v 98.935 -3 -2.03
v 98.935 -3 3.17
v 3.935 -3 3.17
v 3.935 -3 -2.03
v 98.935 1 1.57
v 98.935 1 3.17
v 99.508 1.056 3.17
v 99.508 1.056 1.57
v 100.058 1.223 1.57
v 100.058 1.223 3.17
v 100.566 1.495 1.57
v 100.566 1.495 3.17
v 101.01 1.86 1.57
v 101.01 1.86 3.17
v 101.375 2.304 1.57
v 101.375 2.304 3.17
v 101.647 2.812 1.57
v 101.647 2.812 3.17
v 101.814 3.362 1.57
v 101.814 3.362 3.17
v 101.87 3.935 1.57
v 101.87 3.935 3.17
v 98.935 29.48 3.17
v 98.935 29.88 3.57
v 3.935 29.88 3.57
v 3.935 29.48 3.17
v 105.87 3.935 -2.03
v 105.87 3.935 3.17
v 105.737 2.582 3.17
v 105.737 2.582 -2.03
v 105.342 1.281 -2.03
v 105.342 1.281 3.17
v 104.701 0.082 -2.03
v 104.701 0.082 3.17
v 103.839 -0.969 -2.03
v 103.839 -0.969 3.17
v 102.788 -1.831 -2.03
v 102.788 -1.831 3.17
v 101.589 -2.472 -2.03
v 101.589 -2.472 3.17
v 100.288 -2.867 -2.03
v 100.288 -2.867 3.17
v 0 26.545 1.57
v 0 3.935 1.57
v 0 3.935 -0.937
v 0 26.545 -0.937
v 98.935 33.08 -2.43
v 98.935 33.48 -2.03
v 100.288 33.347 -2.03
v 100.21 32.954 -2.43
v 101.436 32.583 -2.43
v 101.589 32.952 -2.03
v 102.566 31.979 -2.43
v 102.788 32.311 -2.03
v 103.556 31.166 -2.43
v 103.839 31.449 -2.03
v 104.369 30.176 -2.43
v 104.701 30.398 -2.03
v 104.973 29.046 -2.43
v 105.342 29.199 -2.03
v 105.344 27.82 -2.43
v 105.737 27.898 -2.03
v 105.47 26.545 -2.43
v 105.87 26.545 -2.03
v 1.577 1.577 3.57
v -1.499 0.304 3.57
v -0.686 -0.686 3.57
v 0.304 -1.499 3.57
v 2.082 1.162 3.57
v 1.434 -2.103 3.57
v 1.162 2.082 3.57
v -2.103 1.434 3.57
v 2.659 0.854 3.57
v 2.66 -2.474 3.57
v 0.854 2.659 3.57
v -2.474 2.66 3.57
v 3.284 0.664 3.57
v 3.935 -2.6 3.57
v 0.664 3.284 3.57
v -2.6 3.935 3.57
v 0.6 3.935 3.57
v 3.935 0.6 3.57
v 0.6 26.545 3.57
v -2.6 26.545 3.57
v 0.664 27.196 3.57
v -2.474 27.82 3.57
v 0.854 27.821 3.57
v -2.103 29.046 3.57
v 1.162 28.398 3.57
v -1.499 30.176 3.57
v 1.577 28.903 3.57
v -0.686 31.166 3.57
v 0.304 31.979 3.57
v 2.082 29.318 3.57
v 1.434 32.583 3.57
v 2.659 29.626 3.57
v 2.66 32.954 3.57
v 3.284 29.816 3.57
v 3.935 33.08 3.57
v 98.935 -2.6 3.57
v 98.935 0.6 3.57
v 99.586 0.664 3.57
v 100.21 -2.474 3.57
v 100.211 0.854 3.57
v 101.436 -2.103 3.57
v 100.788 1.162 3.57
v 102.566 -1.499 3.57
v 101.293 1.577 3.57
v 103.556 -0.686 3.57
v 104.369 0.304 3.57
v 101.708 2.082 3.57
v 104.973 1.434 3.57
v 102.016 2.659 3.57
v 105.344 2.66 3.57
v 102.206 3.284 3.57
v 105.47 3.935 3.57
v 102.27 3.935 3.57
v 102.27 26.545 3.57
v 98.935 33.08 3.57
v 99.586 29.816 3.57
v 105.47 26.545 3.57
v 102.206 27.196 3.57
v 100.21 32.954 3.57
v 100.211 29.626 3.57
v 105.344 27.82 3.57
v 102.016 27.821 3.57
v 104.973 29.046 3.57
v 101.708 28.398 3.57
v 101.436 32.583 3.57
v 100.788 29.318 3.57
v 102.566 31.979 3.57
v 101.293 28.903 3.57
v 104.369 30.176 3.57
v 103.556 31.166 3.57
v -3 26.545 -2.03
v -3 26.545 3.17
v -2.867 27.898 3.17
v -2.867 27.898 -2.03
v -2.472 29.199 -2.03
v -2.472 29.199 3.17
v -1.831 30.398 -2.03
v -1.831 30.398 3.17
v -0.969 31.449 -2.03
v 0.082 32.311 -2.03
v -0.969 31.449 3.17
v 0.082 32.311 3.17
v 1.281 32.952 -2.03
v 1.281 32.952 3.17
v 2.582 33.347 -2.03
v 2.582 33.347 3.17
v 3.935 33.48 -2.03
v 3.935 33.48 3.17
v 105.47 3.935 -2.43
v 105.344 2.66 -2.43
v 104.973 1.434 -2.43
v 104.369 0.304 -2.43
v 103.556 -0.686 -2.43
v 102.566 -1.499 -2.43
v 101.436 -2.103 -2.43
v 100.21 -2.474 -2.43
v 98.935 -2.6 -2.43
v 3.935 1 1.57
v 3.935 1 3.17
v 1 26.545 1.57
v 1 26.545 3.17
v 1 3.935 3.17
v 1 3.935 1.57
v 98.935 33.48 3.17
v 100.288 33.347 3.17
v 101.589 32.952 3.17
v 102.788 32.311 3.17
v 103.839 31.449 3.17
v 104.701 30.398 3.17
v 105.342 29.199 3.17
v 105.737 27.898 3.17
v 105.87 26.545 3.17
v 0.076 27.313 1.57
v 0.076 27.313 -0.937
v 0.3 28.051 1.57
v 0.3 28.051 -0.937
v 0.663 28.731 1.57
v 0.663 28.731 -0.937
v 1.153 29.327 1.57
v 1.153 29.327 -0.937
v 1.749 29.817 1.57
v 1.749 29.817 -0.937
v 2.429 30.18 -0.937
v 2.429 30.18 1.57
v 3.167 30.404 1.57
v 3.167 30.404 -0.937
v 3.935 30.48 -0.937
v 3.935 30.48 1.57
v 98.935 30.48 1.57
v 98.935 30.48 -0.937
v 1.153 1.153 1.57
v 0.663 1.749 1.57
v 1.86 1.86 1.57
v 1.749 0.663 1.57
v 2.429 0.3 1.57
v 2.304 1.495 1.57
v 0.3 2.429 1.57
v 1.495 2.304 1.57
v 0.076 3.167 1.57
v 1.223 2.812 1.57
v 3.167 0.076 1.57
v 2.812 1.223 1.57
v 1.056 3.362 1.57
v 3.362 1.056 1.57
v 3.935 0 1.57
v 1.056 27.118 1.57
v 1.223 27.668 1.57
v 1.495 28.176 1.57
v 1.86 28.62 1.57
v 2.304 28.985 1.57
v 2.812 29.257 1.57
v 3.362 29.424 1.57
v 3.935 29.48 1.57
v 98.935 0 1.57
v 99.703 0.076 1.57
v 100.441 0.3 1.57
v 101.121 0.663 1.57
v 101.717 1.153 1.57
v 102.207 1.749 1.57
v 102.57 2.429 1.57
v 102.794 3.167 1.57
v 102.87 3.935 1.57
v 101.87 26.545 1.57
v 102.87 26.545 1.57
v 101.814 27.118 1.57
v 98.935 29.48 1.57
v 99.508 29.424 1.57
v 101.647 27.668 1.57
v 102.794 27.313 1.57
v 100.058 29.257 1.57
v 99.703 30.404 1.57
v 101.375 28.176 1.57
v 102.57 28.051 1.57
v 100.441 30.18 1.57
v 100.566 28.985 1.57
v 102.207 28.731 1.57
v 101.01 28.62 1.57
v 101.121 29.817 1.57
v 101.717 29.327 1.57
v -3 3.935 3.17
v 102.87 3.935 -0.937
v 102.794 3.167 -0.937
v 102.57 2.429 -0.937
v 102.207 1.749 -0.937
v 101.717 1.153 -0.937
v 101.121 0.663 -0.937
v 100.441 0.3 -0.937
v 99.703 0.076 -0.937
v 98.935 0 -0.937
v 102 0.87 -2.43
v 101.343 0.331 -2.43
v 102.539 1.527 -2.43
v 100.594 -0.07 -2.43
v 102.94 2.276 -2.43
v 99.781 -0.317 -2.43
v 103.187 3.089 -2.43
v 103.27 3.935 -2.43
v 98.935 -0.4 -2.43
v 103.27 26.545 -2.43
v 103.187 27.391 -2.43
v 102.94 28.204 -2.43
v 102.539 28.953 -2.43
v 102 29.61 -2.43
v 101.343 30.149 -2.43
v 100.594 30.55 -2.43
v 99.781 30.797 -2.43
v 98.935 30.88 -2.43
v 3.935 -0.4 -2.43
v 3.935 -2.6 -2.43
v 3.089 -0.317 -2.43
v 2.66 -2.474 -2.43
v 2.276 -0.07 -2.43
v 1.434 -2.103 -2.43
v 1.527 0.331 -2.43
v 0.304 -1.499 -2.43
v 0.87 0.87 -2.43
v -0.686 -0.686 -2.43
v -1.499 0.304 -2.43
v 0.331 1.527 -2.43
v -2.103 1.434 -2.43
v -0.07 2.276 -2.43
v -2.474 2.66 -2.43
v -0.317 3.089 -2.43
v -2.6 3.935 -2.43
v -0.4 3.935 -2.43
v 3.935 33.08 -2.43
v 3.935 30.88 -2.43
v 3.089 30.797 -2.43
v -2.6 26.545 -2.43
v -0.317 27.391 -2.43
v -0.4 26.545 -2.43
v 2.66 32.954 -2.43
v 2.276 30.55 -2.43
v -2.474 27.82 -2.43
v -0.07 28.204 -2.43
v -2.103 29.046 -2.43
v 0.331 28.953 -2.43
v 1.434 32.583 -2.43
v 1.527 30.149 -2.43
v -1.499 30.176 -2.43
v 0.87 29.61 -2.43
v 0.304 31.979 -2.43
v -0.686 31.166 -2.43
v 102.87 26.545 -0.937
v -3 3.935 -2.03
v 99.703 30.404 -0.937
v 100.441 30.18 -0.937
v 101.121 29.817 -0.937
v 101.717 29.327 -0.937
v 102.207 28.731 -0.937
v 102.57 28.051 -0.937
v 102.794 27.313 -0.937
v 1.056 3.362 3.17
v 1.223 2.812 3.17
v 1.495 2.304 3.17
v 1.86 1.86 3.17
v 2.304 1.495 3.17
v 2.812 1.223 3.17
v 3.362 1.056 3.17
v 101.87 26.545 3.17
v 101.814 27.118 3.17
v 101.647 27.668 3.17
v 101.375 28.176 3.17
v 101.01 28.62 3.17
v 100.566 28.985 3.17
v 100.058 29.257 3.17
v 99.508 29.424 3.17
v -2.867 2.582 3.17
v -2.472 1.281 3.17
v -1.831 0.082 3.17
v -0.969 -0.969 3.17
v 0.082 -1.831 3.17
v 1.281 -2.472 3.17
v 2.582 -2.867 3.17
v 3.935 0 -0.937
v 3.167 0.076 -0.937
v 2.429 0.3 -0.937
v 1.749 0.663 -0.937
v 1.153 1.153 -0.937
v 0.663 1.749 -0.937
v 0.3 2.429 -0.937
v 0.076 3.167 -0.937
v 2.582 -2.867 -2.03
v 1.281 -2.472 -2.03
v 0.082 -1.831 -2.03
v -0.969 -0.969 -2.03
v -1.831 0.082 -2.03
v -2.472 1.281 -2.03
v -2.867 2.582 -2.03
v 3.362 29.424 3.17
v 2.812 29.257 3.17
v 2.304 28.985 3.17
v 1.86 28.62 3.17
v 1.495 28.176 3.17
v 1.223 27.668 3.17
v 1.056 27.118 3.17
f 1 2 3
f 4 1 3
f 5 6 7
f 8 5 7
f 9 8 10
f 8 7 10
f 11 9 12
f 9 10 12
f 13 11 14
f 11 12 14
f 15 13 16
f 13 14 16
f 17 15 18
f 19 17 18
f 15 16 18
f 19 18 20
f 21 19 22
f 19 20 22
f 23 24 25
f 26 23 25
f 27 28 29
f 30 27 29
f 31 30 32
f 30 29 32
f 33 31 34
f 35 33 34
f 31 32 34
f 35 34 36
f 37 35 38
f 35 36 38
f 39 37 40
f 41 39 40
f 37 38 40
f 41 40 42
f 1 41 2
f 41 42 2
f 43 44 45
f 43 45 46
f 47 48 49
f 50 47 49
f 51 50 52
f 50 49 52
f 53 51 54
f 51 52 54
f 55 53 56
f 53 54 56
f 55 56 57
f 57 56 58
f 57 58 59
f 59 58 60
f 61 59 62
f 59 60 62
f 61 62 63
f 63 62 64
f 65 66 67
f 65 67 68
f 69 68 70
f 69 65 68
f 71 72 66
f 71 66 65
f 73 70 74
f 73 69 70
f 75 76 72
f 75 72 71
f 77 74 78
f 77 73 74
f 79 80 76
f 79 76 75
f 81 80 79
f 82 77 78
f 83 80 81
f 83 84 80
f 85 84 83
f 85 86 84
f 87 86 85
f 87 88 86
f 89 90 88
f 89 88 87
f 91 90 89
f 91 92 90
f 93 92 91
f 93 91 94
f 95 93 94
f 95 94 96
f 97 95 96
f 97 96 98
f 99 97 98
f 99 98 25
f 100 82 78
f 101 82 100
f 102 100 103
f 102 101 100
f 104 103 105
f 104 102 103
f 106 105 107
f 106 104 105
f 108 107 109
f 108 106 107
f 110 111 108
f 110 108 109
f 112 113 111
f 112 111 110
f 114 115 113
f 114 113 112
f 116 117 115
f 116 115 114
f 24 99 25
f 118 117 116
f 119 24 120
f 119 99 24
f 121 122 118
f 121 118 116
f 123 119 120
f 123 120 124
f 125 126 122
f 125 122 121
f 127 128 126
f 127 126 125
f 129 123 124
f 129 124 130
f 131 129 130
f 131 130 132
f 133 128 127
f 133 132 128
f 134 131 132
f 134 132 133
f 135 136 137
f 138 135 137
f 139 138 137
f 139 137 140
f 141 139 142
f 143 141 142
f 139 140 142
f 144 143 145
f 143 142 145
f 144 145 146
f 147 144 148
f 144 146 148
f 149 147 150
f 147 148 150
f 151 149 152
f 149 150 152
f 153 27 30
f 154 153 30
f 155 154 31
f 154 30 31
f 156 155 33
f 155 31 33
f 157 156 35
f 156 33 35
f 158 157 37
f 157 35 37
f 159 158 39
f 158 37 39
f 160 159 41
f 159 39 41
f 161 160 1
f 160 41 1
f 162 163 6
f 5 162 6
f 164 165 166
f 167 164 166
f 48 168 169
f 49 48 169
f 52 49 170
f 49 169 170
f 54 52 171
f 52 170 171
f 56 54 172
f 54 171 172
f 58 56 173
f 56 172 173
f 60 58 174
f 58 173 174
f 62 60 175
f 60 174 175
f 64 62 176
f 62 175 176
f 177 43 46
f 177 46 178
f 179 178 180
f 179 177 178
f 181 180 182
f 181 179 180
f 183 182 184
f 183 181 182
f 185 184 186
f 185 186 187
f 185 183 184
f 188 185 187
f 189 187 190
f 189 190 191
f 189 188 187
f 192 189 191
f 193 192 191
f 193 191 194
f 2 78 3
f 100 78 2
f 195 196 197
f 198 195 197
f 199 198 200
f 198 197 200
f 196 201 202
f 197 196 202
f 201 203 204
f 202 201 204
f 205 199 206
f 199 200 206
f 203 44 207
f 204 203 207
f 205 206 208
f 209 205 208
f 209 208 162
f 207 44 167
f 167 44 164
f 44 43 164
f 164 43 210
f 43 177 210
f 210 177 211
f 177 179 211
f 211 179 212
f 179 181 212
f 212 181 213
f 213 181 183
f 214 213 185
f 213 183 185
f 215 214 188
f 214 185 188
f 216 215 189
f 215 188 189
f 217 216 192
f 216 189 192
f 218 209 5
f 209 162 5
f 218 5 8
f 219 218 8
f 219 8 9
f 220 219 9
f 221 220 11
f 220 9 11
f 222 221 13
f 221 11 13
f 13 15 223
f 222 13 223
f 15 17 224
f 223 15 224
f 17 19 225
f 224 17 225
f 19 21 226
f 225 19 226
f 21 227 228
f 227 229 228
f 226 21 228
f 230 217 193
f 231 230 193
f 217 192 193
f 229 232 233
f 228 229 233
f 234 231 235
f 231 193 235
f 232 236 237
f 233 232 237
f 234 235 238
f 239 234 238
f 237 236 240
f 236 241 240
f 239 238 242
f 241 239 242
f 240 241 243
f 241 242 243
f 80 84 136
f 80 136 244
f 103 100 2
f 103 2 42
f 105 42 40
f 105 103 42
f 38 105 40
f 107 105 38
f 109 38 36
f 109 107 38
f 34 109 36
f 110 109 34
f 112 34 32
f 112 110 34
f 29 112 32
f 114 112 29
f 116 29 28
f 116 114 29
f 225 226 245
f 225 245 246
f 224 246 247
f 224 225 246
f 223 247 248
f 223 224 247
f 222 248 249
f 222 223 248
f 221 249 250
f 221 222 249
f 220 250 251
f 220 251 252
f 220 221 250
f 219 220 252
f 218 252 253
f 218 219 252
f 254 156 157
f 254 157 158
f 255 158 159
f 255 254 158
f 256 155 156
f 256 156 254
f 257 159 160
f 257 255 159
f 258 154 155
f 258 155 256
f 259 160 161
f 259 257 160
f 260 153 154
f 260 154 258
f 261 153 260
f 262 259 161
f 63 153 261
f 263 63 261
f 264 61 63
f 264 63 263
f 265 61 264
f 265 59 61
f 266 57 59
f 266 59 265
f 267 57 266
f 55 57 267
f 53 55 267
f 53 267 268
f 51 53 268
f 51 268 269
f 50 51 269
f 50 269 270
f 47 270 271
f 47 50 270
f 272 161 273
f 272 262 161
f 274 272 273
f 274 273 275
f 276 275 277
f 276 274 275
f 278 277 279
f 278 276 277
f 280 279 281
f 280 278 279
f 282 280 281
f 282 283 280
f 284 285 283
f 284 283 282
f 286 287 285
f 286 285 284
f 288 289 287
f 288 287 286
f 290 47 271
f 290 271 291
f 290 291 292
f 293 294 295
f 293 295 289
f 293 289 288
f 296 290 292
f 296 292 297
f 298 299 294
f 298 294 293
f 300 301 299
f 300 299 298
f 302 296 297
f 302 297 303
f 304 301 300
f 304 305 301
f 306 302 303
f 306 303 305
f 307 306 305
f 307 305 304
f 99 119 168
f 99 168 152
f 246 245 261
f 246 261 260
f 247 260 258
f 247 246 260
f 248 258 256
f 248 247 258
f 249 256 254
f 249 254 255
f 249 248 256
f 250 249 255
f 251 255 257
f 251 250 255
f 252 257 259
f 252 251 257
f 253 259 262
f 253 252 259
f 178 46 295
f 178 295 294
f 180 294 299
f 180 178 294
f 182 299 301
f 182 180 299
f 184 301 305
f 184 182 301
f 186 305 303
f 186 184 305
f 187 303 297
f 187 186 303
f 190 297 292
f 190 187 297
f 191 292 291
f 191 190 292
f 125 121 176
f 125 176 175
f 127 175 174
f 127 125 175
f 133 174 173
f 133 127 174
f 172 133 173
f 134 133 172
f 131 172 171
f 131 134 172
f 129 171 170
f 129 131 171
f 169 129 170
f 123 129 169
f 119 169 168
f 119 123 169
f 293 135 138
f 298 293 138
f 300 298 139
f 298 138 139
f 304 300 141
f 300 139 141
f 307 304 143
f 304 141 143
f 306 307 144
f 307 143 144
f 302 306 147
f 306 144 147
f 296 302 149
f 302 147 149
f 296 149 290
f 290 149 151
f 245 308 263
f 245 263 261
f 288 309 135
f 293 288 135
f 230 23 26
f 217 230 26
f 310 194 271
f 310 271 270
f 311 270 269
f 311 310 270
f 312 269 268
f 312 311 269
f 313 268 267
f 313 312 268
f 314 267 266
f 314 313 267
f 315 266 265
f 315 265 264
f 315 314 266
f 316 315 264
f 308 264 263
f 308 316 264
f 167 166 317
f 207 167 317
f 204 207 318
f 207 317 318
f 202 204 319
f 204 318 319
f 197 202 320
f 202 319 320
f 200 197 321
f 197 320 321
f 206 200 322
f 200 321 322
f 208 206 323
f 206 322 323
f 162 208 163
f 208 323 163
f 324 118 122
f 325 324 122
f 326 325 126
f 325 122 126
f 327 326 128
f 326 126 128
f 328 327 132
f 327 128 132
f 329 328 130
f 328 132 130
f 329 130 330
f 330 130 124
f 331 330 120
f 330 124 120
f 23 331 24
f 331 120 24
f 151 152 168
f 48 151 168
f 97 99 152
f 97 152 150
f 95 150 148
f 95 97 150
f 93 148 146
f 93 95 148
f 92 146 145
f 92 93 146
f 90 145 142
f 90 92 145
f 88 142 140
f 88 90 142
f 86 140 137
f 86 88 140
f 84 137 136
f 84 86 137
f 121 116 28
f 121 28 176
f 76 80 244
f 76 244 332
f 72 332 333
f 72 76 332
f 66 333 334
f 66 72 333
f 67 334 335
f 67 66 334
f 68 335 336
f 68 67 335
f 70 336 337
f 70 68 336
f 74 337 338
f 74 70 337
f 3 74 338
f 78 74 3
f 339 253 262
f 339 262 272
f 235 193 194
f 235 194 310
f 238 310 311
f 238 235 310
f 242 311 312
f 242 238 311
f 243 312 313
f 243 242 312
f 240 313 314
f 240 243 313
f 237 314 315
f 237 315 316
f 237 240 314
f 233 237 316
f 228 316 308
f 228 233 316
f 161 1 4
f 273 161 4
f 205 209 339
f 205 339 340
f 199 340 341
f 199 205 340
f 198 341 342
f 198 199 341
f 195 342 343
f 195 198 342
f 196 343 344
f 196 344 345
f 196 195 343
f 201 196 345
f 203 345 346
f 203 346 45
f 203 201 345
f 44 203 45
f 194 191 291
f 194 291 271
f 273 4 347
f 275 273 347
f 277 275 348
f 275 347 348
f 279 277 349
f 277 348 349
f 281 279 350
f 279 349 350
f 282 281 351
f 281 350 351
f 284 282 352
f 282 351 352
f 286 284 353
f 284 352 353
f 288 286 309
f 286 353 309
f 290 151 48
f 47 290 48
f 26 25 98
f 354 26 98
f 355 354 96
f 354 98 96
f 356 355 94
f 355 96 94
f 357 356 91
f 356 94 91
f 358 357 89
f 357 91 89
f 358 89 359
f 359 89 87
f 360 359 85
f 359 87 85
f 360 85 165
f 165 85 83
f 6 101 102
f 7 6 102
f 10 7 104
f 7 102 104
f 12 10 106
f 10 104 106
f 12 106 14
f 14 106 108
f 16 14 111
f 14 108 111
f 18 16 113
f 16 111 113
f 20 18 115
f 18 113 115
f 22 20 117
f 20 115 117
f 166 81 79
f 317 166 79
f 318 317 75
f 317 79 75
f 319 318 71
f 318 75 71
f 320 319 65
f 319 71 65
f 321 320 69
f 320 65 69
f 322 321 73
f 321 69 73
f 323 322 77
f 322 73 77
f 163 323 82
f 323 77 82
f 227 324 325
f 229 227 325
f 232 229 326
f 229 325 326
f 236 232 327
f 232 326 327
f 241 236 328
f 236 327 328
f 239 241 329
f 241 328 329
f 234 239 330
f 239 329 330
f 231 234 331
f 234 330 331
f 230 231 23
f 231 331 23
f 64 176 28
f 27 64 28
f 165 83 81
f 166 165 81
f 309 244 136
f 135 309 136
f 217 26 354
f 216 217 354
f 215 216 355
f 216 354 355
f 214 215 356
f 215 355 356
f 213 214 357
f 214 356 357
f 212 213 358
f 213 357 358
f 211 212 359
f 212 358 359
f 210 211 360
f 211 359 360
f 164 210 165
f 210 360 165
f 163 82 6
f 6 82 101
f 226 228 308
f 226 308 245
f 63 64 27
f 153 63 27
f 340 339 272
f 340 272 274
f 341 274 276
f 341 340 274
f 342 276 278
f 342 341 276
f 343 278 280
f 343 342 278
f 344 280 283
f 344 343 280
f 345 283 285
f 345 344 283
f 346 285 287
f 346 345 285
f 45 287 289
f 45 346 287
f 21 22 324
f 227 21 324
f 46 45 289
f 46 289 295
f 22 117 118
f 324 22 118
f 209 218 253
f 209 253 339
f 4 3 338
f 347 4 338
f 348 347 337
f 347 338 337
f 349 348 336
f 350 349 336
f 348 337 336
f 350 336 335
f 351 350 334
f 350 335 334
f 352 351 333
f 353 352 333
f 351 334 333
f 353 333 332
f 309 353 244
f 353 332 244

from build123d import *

# Parameters (mm, degrees)
SKETCH1_W           = 102.87
SKETCH1_H           = 30.48
BOSS_EXTRUDE1_DEPTH = 1.57
FILLET1_R           = 3.935
BOSS_EXTRUDE2_DEPTH = 2
BOSS_EXTRUDE4_DEPTH = 4
BOSS_EXTRUDE5_DEPTH = 2
CHAMFER1_SIZE       = 0.4
CHAMFER1_SIZE2      = 1.492820323
CHAMFER2_SIZE       = 0.4


with BuildPart() as part:
    # Sketch1 → Boss-Extrude1 (new body)
    with BuildSketch(Plane.XY):
        with Locations((51.435, 15.24)):
            Rectangle(SKETCH1_W, SKETCH1_H)
    extrude(amount=BOSS_EXTRUDE1_DEPTH)

    # Fillet1
    fillet1_edges = [part.edges().sort_by_distance(p)[0] for p in [
        (0, 30.48, 0.785),
        (102.87, 30.48, 0.785),
        (102.87, 0, 0.785),
        (0, 0, 0.785),
    ]]
    fillet(fillet1_edges, radius=FILLET1_R)


with BuildPart() as body_2:
    # Sketch7 → Boss-Extrude2 (new body)
    with BuildSketch(Plane.XY.offset(1.57)):
        with BuildLine():
            Line((-3, 26.545), (-3, 3.935))
            ThreePointArc((-3, 3.935), (-0.968785528, -0.968785528), (3.935, -3))
            Line((3.935, -3), (98.935, -3))
            ThreePointArc((98.935, -3), (103.838785528, -0.968785528), (105.87, 3.935))
            Line((105.87, 3.935), (105.87, 26.545))
            ThreePointArc((105.87, 26.545), (103.838785528, 31.448785528), (98.935, 33.48))
            Line((98.935, 33.48), (3.935, 33.48))
            ThreePointArc((3.935, 33.48), (-0.968785528, 31.448785528), (-3, 26.545))
        make_face()
        with BuildLine():
            Line((0, 26.545), (0, 3.935))
            ThreePointArc((0, 3.935), (1.152534816, 1.152534816), (3.935, 0))
            Line((3.935, 0), (98.935, 0))
            ThreePointArc((98.935, 0), (101.717465184, 1.152534816), (102.87, 3.935))
            Line((102.87, 3.935), (102.87, 26.545))
            ThreePointArc((102.87, 26.545), (101.717465184, 29.327465184), (98.935, 30.48))
            Line((98.935, 30.48), (3.935, 30.48))
            ThreePointArc((3.935, 30.48), (1.152534816, 29.327465184), (0, 26.545))
        make_face(mode=Mode.SUBTRACT)
    extrude(amount=BOSS_EXTRUDE2_DEPTH)

    # Sketch9 → Boss-Extrude4 (add)
    with BuildSketch(Plane(origin=(0, 0, 1.57), x_dir=(-1, 0, 0), z_dir=(0, 0, -1))):
        with BuildLine():
            Line((-3.935, 33.48), (-98.935, 33.48))
            ThreePointArc((-98.935, 33.48), (-103.838785528, 31.448785528), (-105.87, 26.545))
            Line((-105.87, 26.545), (-105.87, 3.935))
            ThreePointArc((-105.87, 3.935), (-103.838785528, -0.968785528), (-98.935, -3))
            Line((-98.935, -3), (-3.935, -3))
            ThreePointArc((-3.935, -3), (0.968785528, -0.968785528), (3, 3.935))
            Line((3, 3.935), (3, 26.545))
            ThreePointArc((3, 26.545), (0.968785528, 31.448785528), (-3.935, 33.48))
        make_face()
        with BuildLine():
            Line((-98.935, 0), (-3.935, 0))
            ThreePointArc((-3.935, 0), (-1.152534816, 1.152534816), (0, 3.935))
            Line((0, 3.935), (0, 26.545))
            ThreePointArc((0, 26.545), (-1.152534816, 29.327465184), (-3.935, 30.48))
            Line((-3.935, 30.48), (-98.935, 30.48))
            ThreePointArc((-98.935, 30.48), (-101.717465184, 29.327465184), (-102.87, 26.545))
            Line((-102.87, 26.545), (-102.87, 3.935))
            ThreePointArc((-102.87, 3.935), (-101.717465184, 1.152534816), (-98.935, 0))
        make_face(mode=Mode.SUBTRACT)
    extrude(amount=BOSS_EXTRUDE4_DEPTH)

    # Sketch11 → Boss-Extrude5 (add)
    with BuildSketch(Plane.XY.offset(3.57)):
        with BuildLine():
            Line((-3, 26.545), (-3, 3.935))
            ThreePointArc((-3, 3.935), (-0.968785528, -0.968785528), (3.935, -3))
            Line((3.935, -3), (98.935, -3))
            ThreePointArc((98.935, -3), (103.838785528, -0.968785528), (105.87, 3.935))
            Line((105.87, 3.935), (105.87, 26.545))
            ThreePointArc((105.87, 26.545), (103.838785528, 31.448785528), (98.935, 33.48))
            Line((98.935, 33.48), (3.935, 33.48))
            ThreePointArc((3.935, 33.48), (-0.968785528, 31.448785528), (-3, 26.545))
        make_face()
        with BuildLine():
            Line((101.87, 3.935), (101.87, 26.545))
            ThreePointArc((101.87, 26.545), (101.010358403, 28.620358403), (98.935, 29.48))
            Line((98.935, 29.48), (3.935, 29.48))
            ThreePointArc((3.935, 29.48), (1.859641597, 28.620358403), (1, 26.545))
            Line((1, 26.545), (1, 3.935))
            ThreePointArc((1, 3.935), (1.859641597, 1.859641597), (3.935, 1))
            Line((3.935, 1), (98.935, 1))
            ThreePointArc((98.935, 1), (101.010358403, 1.859641597), (101.87, 3.935))
        make_face(mode=Mode.SUBTRACT)
    extrude(amount=-BOSS_EXTRUDE5_DEPTH)

    # Chamfer1
    chamfer1_edges = [body_2.edges().sort_by_distance(p)[0] for p in [
        (101.717465184, 1.152534816, -2.43),
        (51.435, 0, -2.43),
        (1.152534816, 1.152534816, -2.43),
        (0, 15.24, -2.43),
        (1.152534816, 29.327465184, -2.43),
        (51.435, 30.48, -2.43),
        (101.717465184, 29.327465184, -2.43),
        (102.87, 15.24, -2.43),
    ]]
    chamfer1_side = [body_2.faces().sort_by_distance(p)[0] for p in [
        (-0.156890605, 30.636890605, -2.43),
    ]]
    chamfer(chamfer1_edges, length=CHAMFER1_SIZE, length2=CHAMFER1_SIZE2, reference=chamfer1_side[0])

    # Chamfer2
    chamfer2_edges = [body_2.edges().sort_by_distance(p)[0] for p in [
        (101.010358403, 1.859641597, 3.57),
        (51.435, 1, 3.57),
        (1.859641597, 1.859641597, 3.57),
        (1, 15.24, 3.57),
        (1.859641597, 28.620358403, 3.57),
        (51.435, 29.48, 3.57),
        (101.010358403, 28.620358403, 3.57),
        (101.87, 15.24, 3.57),
        (-0.968785528, -0.968785528, 3.57),
        (51.435, -3, 3.57),
        (103.838785528, -0.968785528, 3.57),
        (105.87, 15.24, 3.57),
        (103.838785528, 31.448785528, 3.57),
        (51.435, 33.48, 3.57),
        (-0.968785528, 31.448785528, 3.57),
        (-0.968785528, 31.448785528, -2.43),
        (51.435, 33.48, -2.43),
        (103.838785528, 31.448785528, -2.43),
        (105.87, 15.24, -2.43),
        (103.838785528, -0.968785528, -2.43),
        (51.435, -3, -2.43),
        (-0.968785528, -0.968785528, -2.43),
        (-3, 15.24, -2.43),
        (-3, 15.24, 3.57),
    ]]
    chamfer(chamfer2_edges, length=CHAMFER2_SIZE)


solid = body_2.part
